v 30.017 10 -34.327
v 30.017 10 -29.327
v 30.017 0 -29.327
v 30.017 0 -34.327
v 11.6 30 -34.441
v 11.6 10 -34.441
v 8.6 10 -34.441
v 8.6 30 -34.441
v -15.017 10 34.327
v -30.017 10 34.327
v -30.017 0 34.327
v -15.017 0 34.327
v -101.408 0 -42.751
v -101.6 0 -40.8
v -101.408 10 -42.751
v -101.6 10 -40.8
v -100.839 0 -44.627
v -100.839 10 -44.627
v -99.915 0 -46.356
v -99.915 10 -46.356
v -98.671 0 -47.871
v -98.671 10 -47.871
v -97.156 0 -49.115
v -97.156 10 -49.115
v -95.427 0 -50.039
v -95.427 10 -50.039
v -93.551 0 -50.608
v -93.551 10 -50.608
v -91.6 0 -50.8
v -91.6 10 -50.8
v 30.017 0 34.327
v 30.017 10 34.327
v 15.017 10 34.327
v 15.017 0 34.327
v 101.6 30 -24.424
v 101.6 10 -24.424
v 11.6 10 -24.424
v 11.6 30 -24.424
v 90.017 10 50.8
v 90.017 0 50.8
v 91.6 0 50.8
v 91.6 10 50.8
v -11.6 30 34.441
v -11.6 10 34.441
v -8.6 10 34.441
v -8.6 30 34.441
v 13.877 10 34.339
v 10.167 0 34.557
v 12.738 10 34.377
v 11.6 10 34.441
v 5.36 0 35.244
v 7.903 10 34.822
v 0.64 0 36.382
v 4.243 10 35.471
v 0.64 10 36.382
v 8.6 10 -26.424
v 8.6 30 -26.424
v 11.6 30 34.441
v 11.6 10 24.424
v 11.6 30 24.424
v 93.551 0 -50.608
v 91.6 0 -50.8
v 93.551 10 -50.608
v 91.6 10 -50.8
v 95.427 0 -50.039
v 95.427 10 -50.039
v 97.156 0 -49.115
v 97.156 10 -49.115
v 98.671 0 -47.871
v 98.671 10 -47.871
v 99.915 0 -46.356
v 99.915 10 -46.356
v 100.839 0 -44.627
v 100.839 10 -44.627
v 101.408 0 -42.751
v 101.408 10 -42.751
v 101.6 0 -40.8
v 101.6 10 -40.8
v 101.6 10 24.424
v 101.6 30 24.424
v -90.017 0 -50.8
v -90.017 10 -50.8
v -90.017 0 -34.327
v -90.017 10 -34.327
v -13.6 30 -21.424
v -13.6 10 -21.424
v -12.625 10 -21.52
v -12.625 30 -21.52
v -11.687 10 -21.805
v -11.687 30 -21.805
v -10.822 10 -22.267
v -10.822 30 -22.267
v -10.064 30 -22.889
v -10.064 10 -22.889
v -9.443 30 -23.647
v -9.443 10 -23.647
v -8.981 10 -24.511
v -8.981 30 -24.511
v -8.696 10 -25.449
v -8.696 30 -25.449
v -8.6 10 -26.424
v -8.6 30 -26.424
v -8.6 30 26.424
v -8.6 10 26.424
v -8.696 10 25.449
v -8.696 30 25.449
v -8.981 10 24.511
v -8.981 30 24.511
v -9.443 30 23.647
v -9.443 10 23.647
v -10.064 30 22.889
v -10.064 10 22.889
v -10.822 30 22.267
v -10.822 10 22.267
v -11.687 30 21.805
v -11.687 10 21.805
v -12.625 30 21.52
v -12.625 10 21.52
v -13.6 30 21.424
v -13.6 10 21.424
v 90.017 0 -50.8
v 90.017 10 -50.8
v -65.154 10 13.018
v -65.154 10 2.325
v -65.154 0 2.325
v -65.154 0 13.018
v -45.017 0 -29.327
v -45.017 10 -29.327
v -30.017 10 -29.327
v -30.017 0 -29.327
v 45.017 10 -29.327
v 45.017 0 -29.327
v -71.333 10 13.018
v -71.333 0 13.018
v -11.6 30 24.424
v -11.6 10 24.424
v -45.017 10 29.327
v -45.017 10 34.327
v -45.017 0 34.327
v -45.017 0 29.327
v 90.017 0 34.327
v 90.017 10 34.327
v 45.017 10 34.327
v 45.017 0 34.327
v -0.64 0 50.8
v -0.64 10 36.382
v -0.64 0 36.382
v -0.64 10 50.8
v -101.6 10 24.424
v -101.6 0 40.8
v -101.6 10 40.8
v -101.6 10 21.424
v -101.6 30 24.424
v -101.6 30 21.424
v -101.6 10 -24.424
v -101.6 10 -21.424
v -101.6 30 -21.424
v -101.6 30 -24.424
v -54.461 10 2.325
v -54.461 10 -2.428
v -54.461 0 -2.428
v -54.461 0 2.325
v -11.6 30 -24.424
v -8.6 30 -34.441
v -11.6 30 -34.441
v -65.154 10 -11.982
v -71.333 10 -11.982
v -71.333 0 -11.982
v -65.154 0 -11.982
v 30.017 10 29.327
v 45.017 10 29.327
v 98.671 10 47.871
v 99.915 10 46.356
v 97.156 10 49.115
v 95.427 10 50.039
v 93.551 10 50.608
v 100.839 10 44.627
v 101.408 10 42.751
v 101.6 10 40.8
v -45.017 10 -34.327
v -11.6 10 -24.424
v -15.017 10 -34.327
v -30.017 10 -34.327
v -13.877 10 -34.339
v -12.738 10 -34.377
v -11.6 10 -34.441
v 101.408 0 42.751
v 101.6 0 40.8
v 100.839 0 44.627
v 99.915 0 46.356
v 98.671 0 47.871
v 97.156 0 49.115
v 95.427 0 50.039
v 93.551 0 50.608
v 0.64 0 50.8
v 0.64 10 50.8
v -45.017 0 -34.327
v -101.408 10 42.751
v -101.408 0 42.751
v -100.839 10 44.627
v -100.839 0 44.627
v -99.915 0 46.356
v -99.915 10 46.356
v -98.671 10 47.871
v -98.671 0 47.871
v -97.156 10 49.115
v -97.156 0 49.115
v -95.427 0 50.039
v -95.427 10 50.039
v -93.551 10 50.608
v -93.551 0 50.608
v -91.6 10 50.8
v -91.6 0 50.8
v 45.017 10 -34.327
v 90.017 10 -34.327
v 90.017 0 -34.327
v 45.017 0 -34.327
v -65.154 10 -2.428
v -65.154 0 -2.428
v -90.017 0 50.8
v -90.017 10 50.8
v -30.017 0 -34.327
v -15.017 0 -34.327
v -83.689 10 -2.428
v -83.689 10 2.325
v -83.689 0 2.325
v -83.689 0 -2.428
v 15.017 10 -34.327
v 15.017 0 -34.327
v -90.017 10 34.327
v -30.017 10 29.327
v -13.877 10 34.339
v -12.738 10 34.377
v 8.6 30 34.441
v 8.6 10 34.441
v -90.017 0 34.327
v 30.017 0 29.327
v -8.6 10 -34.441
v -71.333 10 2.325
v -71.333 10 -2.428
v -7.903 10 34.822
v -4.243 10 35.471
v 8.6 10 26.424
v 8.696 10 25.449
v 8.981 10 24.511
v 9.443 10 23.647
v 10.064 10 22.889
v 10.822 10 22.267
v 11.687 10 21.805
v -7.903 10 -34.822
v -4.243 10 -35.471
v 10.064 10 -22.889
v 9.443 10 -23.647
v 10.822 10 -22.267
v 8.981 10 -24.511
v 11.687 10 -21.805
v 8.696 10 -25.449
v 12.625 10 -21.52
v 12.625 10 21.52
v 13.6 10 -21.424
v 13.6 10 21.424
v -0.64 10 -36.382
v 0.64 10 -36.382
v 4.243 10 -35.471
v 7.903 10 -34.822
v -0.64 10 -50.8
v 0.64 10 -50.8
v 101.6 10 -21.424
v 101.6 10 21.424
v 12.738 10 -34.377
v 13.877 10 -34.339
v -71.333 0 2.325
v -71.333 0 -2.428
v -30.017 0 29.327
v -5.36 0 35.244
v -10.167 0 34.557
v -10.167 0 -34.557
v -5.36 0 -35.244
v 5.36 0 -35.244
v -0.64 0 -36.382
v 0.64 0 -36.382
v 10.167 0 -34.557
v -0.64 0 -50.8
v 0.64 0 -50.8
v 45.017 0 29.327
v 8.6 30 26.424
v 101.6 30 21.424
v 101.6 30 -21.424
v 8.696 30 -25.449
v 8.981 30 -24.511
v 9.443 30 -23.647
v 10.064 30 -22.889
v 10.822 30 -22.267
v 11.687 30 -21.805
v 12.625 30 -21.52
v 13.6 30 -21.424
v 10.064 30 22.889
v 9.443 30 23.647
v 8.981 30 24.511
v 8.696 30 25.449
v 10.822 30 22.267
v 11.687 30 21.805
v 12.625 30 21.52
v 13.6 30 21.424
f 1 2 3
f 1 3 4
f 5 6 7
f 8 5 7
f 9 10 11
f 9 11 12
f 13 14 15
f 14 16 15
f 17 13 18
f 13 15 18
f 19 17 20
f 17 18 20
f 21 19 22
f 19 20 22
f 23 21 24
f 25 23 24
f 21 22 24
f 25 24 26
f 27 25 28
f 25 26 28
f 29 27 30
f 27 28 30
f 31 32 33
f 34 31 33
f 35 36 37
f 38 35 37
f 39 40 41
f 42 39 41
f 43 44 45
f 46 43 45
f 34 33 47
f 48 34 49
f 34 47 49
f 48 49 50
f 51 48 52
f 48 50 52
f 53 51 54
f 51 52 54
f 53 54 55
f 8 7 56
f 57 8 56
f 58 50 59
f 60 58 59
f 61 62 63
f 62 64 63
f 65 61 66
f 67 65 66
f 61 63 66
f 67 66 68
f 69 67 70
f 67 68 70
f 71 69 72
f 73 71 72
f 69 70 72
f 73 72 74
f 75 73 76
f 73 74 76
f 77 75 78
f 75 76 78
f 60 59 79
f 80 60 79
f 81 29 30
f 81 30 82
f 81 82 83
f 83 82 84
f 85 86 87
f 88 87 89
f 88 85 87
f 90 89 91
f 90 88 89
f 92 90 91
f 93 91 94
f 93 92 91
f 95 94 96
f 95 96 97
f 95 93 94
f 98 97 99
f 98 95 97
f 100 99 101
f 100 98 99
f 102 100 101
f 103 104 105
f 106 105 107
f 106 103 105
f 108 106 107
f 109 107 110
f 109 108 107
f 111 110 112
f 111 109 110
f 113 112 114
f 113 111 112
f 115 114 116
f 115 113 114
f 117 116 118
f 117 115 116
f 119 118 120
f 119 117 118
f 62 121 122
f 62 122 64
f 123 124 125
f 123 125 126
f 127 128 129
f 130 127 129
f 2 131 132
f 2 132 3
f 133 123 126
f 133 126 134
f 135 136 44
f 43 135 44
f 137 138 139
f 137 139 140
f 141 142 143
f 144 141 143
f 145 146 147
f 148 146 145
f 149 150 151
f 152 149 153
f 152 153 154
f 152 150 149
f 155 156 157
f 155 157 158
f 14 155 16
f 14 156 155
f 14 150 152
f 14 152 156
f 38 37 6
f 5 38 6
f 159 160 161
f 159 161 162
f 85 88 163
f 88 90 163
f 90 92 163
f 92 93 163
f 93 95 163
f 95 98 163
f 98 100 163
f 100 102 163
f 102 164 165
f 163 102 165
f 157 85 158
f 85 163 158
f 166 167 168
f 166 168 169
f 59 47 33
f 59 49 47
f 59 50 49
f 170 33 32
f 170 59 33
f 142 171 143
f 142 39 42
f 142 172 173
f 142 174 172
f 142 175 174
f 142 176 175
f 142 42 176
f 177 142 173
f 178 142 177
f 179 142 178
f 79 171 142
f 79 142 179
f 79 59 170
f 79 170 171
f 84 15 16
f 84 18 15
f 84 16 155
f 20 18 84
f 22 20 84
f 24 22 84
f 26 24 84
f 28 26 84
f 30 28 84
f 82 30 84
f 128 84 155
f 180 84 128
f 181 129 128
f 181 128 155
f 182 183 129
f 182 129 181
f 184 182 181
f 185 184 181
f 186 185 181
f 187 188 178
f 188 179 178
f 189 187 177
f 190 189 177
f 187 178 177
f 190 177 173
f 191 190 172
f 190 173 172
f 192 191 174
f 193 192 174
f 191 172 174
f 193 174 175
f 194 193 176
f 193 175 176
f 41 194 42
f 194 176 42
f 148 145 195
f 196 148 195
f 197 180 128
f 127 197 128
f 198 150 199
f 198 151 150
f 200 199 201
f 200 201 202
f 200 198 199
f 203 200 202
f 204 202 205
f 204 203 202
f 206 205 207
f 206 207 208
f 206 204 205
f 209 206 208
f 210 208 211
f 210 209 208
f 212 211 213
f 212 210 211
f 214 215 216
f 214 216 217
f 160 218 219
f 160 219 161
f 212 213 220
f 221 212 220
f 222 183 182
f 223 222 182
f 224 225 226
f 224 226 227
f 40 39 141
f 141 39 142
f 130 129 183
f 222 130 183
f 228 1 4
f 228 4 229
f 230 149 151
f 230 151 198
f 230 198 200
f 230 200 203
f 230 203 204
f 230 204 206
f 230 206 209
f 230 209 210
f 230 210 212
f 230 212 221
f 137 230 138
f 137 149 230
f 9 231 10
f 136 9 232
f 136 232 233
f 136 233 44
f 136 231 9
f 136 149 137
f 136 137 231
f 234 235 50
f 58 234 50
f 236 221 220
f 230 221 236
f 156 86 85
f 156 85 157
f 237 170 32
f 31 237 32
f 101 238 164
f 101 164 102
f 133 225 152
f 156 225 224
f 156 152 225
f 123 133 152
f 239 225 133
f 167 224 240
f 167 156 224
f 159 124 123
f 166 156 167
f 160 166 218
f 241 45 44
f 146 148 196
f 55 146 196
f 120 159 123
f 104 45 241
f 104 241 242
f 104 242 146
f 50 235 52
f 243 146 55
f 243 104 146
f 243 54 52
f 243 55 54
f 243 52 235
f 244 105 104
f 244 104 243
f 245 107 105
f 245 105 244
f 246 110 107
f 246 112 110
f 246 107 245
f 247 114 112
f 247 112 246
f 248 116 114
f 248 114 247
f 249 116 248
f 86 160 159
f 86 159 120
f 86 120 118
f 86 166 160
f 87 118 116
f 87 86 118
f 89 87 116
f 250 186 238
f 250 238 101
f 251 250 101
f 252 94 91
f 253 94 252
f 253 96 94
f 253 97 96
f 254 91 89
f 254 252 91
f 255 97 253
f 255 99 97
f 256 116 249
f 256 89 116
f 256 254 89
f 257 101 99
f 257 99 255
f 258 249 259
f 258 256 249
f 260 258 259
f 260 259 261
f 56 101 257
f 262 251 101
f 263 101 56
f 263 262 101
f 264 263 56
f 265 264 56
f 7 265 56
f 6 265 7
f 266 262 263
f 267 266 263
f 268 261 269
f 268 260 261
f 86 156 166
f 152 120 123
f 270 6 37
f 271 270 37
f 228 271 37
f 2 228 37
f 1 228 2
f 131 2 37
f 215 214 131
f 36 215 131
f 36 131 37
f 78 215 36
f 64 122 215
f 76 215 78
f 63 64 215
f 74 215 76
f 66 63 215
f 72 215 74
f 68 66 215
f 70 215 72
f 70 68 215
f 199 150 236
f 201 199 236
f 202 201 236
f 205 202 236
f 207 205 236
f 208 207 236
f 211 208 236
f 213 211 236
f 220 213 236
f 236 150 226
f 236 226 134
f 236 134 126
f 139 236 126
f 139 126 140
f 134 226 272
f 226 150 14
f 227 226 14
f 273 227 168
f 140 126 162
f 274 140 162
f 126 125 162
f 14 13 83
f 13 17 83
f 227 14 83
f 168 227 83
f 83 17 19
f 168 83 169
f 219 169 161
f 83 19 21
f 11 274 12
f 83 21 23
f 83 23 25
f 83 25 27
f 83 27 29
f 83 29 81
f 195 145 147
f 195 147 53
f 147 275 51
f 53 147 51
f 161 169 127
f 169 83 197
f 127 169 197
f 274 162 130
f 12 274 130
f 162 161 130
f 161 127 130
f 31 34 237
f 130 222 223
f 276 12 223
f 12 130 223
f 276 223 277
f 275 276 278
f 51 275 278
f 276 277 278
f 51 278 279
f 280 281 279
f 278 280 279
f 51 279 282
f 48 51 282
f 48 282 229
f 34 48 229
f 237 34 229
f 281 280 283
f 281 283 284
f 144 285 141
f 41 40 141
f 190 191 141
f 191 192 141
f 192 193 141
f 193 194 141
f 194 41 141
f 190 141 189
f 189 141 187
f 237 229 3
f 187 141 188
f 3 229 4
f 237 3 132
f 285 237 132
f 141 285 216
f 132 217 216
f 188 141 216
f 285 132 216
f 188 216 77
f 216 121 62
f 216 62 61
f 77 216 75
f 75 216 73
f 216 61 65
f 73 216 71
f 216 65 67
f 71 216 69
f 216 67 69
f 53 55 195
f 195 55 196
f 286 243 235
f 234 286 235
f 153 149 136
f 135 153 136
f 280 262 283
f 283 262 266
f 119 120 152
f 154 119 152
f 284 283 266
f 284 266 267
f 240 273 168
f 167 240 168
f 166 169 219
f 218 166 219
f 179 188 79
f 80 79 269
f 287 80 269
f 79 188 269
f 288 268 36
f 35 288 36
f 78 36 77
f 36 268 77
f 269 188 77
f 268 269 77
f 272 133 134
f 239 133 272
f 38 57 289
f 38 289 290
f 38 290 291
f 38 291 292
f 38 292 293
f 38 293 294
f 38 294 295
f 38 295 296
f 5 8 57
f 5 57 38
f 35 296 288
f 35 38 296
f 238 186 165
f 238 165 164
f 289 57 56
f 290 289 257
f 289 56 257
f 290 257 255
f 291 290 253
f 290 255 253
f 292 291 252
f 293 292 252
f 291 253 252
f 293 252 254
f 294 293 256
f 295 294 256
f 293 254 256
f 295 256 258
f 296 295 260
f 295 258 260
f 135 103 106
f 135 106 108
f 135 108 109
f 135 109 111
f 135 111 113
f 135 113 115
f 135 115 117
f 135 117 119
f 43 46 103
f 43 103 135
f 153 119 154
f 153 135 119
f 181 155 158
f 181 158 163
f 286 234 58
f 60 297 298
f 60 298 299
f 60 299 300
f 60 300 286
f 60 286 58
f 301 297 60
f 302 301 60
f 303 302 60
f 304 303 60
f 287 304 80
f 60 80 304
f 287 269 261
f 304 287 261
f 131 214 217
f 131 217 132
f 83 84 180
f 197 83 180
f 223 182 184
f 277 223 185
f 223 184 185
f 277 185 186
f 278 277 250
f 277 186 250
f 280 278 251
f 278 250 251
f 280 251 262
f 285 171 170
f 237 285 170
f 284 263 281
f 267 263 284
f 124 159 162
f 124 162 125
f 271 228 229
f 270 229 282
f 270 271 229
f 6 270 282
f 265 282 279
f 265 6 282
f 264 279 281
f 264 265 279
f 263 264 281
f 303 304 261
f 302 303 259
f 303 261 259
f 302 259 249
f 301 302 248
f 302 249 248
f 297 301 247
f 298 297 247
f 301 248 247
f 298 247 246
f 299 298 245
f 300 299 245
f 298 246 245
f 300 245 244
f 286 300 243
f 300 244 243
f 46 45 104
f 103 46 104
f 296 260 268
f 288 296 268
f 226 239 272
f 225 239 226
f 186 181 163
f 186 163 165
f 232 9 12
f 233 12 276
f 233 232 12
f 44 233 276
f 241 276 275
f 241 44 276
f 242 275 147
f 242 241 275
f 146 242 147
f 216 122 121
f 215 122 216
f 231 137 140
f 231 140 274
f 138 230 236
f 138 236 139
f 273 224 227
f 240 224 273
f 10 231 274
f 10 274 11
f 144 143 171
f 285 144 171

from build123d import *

# Parameters (mm, degrees)
SKETCH1_W            = 203.2
SKETCH1_H            = 101.6
BOSS_EXTRUDE1_DEPTH  = 10
CUT_EXTRUDE1_DEPTH   = 115.031574575
MIRROR3_COPY_1_DEPTH = 115.031574575
FILLET2_R            = 10
FILLET3_R            = 10
FILLET4_R            = 10
FILLET5_R            = 10
CUT_EXTRUDE2_DEPTH   = 115.031574575
BOSS_EXTRUDE8_DEPTH  = 20
FILLET9_R            = 5
FILLET9_OF_MIRROR7_R = 5
MIRROR9_START        = 10
MIRROR9_DEPTH        = 20


# Read off the part's stored shape, not the designer's step: Mirror9
with BuildPart() as part:
    # Sketch1 → Boss-Extrude1 (new body)
    with BuildSketch(Plane(origin=(0, 0, 0), x_dir=(1, 0, 0), z_dir=(0, 1, 0))):
        Rectangle(SKETCH1_W, SKETCH1_H)
    extrude(amount=BOSS_EXTRUDE1_DEPTH)

    # Sketch4 → Cut-Extrude1 (cut, through all)
    with BuildSketch(Plane(origin=(0, 10, 0), x_dir=(1, 0, 0), z_dir=(0, 1, 0))):
        with BuildLine():
            Line((-30.016608914, 34.326781051), (-15.016608914, 34.326781051))
            ThreePointArc((-15.016608914, 34.326781051), (-7.755121488, 34.843235841), (-0.639820714, 36.382203056))
            Line((-0.639820714, 36.382203056), (-0.639820714, 56.908402461))
            Line((-0.639820714, 56.908402461), (-90.016608914, 56.908402461))
            Line((-90.016608914, 56.908402461), (-90.016608914, 34.326781051))
            Line((-90.016608914, 34.326781051), (-45.016608914, 34.326781051))
            Line((-45.016608914, 34.326781051), (-45.016608914, 29.326781051))
            Line((-45.016608914, 29.326781051), (-30.016608914, 29.326781051))
            Line((-30.016608914, 29.326781051), (-30.016608914, 34.326781051))
        make_face()
    cut_extrude1 = extrude(amount=-CUT_EXTRUDE1_DEPTH, mode=Mode.SUBTRACT)

    # Mirror2: Cut-Extrude1 across plane
    add(cut_extrude1.mirror(Plane.XY), mode=Mode.SUBTRACT)

    # Mirror3: Cut-Extrude1 across plane
    add(cut_extrude1.mirror(Plane(origin=(0, 0, 0), x_dir=(0, 0, 1), z_dir=(1, 0, 0))), mode=Mode.SUBTRACT)

    # Mirror3 copy 1 sketch → Mirror3 copy 1 (cut, through all)
    with BuildSketch(Plane(origin=(0, 10, 0), x_dir=(-1, 0, 0), z_dir=(0, 1, 0))):
        with BuildLine():
            Line((-30.016608914, 34.326781051), (-15.016608914, 34.326781051))
            ThreePointArc((-15.016608914, 34.326781051), (-7.755121488, 34.843235841), (-0.639820714, 36.382203056))
            Line((-0.639820714, 36.382203056), (-0.639820714, 56.908402461))
            Line((-0.639820714, 56.908402461), (-90.016608914, 56.908402461))
            Line((-90.016608914, 56.908402461), (-90.016608914, 34.326781051))
            Line((-90.016608914, 34.326781051), (-45.016608914, 34.326781051))
            Line((-45.016608914, 34.326781051), (-45.016608914, 29.326781051))
            Line((-45.016608914, 29.326781051), (-30.016608914, 29.326781051))
            Line((-30.016608914, 29.326781051), (-30.016608914, 34.326781051))
        make_face()
    extrude(amount=-MIRROR3_COPY_1_DEPTH, mode=Mode.SUBTRACT)

    # Fillet2
    fillet2_edges = [part.edges().sort_by_distance(p)[0] for p in [
        (-101.6, 5, 50.8),
    ]]
    fillet(fillet2_edges, radius=FILLET2_R)

    # Fillet3
    fillet3_edges = [part.edges().sort_by_distance(p)[0] for p in [
        (-101.6, 5, -50.8),
    ]]
    fillet(fillet3_edges, radius=FILLET3_R)

    # Fillet4
    fillet4_edges = [part.edges().sort_by_distance(p)[0] for p in [
        (101.6, 5, -50.8),
    ]]
    fillet(fillet4_edges, radius=FILLET4_R)

    # Fillet5
    fillet5_edges = [part.edges().sort_by_distance(p)[0] for p in [
        (101.6, 5, 50.8),
    ]]
    fillet(fillet5_edges, radius=FILLET5_R)

    # Sketch6 → Cut-Extrude2 (cut, through all)
    with BuildSketch(Plane(origin=(0, 10, 0), x_dir=(1, 0, 0), z_dir=(0, 1, 0))):
        Polygon((-65.154466358, 2.427920334), (-54.461184026, 2.427920334), (-54.461184026, -2.324649591), (-65.154466358, -2.324649591), (-65.154466358, -13.017931923), (-71.33280726, -13.017931923), (-71.33280726, -2.324649591), (-83.689489065, -2.324649591), (-83.689489065, 2.427920334), (-71.33280726, 2.427920334), (-71.33280726, 11.982068077), (-65.154466358, 11.982068077), align=None)
    extrude(amount=-CUT_EXTRUDE2_DEPTH, mode=Mode.SUBTRACT)

    # Sketch11 → Boss-Extrude8 (add)
    with BuildSketch(Plane(origin=(0, 10, 0), x_dir=(1, 0, 0), z_dir=(0, 1, 0))):
        Polygon((-101.6, 24.424351811), (-11.6, 24.424351811), (-11.6, 34.440665029), (-8.6, 34.440665029), (-8.6, 21.424351811), (-101.6, 21.424351811), align=None)
    boss_extrude8 = extrude(amount=BOSS_EXTRUDE8_DEPTH)

    # Fillet9
    fillet9_edges = [part.edges().sort_by_distance(p)[0] for p in [
        (-8.6, 20, -21.424351811),
    ]]
    fillet(fillet9_edges, radius=FILLET9_R)

    # Mirror7: Boss-Extrude8 across plane
    add(boss_extrude8.mirror(Plane.XY))

    # Fillet9 of Mirror7
    fillet9_of_mirror7_edges = [part.edges().sort_by_distance(p)[0] for p in [
        (-8.6, 20, 21.424351811),
    ]]
    fillet(fillet9_of_mirror7_edges, radius=FILLET9_OF_MIRROR7_R)

    # Mirror9 outline → Mirror9 (add)
    with BuildSketch(Plane(origin=(0, 0, 0), x_dir=(1, 0, 0), z_dir=(0, 1, 0)).offset(MIRROR9_START)):
        with BuildLine():
            Line((11.6, 24.424351811), (11.6, 34.440665029))
            Line((11.6, 34.440665029), (8.6, 34.440665029))
            Line((8.6, 34.440665029), (8.6, 26.424351811))
            ThreePointArc((8.6, 26.424351811), (10.064466094, 22.888817905), (13.6, 21.424351811))
            Line((13.6, 21.424351811), (101.6, 21.424351811))
            Line((101.6, 21.424351811), (101.6, 24.424351811))
            Line((101.6, 24.424351811), (11.6, 24.424351811))
        make_face()
        with BuildLine():
            Line((101.6, -24.424351811), (101.6, -21.424351811))
            Line((101.6, -21.424351811), (13.6, -21.424351811))
            ThreePointArc((13.6, -21.424351811), (10.064466094, -22.888817905), (8.6, -26.424351811))
            Line((8.6, -26.424351811), (8.6, -34.440665029))
            Line((8.6, -34.440665029), (11.6, -34.440665029))
            Line((11.6, -34.440665029), (11.6, -24.424351811))
            Line((11.6, -24.424351811), (101.6, -24.424351811))
        make_face()
    extrude(amount=MIRROR9_DEPTH)


solid = part.part
